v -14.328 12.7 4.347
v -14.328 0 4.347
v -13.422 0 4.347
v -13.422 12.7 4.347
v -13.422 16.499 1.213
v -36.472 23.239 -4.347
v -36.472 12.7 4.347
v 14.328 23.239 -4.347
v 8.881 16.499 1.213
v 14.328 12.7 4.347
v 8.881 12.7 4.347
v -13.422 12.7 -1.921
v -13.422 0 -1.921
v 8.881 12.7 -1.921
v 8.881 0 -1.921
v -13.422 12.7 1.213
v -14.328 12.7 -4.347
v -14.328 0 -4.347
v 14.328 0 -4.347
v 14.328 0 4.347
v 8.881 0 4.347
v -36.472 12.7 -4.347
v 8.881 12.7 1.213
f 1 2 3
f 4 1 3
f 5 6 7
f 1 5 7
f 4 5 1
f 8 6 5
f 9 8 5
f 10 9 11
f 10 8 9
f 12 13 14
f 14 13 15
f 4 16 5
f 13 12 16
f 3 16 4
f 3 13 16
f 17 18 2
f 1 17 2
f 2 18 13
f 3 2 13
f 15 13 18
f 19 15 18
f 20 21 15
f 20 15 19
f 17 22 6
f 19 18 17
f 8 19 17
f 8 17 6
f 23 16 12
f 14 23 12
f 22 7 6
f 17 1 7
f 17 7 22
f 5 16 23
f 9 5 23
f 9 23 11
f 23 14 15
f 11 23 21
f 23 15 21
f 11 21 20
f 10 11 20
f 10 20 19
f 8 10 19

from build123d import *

# Parameters (mm, degrees)
F0_W     = 28.655802
F0_H     = 8.69454
F1_DEPTH = 12.7
F2_W     = 22.303285
F2_H     = 6.268458
F3_DEPTH = 50.8
F5_DEPTH = 50.8
F6_W     = 22.303285
F6_H     = 3.134229
F7_DEPTH = 25.4


with BuildPart() as f1:
    # F0 (on Front) → F1 (new body)
    with BuildSketch(Plane.XZ):
        Rectangle(F0_W, F0_H)
    extrude(amount=-F1_DEPTH)

    # F2 (on face) → F3 (cut)
    with BuildSketch(Plane.XZ):
        with Locations((-2.270672, 1.213041)):
            Rectangle(F2_W, F2_H)
    extrude(amount=-F3_DEPTH, mode=Mode.SUBTRACT)

    # F4 (on face) → F5 (join)
    with BuildSketch(Plane.YZ.offset(14.327901)):
        Polygon((12.7, 4.34727), (12.7, -4.34727), (23.239153, -4.34727), align=None)
    extrude(amount=-F5_DEPTH)

    # F6 (on face) → F7 (cut)
    with BuildSketch(Plane.XZ.offset(-12.7)):
        with Locations((-2.270672, 2.780156)):
            Rectangle(F6_W, F6_H)
    extrude(amount=-F7_DEPTH, mode=Mode.SUBTRACT)


solid = f1.part
